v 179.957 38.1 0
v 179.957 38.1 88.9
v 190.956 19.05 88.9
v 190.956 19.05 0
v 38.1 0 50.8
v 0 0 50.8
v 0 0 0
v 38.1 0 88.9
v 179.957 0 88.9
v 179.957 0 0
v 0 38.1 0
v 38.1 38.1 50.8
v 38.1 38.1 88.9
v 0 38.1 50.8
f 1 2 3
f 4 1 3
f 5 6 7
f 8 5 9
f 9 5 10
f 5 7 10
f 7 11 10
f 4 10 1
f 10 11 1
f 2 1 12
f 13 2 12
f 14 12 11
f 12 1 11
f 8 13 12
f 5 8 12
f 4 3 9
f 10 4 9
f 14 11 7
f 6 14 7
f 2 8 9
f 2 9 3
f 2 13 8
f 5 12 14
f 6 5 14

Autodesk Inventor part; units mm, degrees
ref_plane "YZ Plane" through (0, 0, 0) normal (1, 0, 0) x (0, 1, 0)
ref_plane "XZ Plane" through (0, 0, 0) normal (0, 1, 0) x (-1, 0, 0)
ref_plane "XY Plane" through (0, 0, 0) normal (0, 0, 1) x (1, 0, 0)
sketch "Sketch1" plane through (0, 0, 0) normal (0, 0, 1) x (1, 0, 0)
  line L0 (0, 0) -> (190.9559, 0)
  line L1 (190.9559, 0) -> (190.9559, 38.1)
  line L2 (190.9559, 38.1) -> (0, 38.1)
  line L3 (0, 38.1) -> (0, 0)
  dimension "d0" = 190.9559
  dimension "d1" = 38.1
extrude "Extrusion1" add sketch "Sketch1" along normal blind 88.9
sketch "Sketch2" plane through (0, 38.1, 0) normal (0, 1, 0) x (1, 0, 0)
  line L0 (0, -88.9) -> (190.9559, -88.9) projected
  line L1 (0, -88.9) -> (38.1, -88.9)
  line L2 (38.1, -88.9) -> (38.1, -50.8)
  line L3 (38.1, -50.8) -> (0, -50.8)
  line L4 (0, -50.8) -> (0, -88.9)
  point P0 (0, 0)
  dimension "d4" = 38.1
  dimension "d5" = 38.1
extrude "Extrusion2" cut sketch "Sketch2" against normal through all
sketch "Sketch4" plane through (0, 0, 88.9) normal (0, 0, 1) x (1, 0, 0)
  line L0 (190.9559, 38.1) -> (0, 38.1) projected
  line L1 (179.9574, 38.1) -> (190.9559, 19.05)
  line L2 (190.9559, 0) -> (190.9559, 38.1) projected
  line L3 (190.9559, 19.05) -> (179.9574, 0)
  line L4 (0, 0) -> (190.9559, 0) projected
  line L5 (179.9574, 0) -> (190.9559, 0)
  line L6 (190.9559, 0) -> (190.9559, 19.05)
  line L7 (190.9559, 38.1) -> (190.9559, 19.05)
  line L8 (179.9574, 38.1) -> (190.9559, 38.1)
  dimension "d12" = 60
  dimension "d13" = 60
extrude "Extrusion4" cut sketch "Sketch4" against normal through all
properties part number "BO04" material "Wood (Oak)"
